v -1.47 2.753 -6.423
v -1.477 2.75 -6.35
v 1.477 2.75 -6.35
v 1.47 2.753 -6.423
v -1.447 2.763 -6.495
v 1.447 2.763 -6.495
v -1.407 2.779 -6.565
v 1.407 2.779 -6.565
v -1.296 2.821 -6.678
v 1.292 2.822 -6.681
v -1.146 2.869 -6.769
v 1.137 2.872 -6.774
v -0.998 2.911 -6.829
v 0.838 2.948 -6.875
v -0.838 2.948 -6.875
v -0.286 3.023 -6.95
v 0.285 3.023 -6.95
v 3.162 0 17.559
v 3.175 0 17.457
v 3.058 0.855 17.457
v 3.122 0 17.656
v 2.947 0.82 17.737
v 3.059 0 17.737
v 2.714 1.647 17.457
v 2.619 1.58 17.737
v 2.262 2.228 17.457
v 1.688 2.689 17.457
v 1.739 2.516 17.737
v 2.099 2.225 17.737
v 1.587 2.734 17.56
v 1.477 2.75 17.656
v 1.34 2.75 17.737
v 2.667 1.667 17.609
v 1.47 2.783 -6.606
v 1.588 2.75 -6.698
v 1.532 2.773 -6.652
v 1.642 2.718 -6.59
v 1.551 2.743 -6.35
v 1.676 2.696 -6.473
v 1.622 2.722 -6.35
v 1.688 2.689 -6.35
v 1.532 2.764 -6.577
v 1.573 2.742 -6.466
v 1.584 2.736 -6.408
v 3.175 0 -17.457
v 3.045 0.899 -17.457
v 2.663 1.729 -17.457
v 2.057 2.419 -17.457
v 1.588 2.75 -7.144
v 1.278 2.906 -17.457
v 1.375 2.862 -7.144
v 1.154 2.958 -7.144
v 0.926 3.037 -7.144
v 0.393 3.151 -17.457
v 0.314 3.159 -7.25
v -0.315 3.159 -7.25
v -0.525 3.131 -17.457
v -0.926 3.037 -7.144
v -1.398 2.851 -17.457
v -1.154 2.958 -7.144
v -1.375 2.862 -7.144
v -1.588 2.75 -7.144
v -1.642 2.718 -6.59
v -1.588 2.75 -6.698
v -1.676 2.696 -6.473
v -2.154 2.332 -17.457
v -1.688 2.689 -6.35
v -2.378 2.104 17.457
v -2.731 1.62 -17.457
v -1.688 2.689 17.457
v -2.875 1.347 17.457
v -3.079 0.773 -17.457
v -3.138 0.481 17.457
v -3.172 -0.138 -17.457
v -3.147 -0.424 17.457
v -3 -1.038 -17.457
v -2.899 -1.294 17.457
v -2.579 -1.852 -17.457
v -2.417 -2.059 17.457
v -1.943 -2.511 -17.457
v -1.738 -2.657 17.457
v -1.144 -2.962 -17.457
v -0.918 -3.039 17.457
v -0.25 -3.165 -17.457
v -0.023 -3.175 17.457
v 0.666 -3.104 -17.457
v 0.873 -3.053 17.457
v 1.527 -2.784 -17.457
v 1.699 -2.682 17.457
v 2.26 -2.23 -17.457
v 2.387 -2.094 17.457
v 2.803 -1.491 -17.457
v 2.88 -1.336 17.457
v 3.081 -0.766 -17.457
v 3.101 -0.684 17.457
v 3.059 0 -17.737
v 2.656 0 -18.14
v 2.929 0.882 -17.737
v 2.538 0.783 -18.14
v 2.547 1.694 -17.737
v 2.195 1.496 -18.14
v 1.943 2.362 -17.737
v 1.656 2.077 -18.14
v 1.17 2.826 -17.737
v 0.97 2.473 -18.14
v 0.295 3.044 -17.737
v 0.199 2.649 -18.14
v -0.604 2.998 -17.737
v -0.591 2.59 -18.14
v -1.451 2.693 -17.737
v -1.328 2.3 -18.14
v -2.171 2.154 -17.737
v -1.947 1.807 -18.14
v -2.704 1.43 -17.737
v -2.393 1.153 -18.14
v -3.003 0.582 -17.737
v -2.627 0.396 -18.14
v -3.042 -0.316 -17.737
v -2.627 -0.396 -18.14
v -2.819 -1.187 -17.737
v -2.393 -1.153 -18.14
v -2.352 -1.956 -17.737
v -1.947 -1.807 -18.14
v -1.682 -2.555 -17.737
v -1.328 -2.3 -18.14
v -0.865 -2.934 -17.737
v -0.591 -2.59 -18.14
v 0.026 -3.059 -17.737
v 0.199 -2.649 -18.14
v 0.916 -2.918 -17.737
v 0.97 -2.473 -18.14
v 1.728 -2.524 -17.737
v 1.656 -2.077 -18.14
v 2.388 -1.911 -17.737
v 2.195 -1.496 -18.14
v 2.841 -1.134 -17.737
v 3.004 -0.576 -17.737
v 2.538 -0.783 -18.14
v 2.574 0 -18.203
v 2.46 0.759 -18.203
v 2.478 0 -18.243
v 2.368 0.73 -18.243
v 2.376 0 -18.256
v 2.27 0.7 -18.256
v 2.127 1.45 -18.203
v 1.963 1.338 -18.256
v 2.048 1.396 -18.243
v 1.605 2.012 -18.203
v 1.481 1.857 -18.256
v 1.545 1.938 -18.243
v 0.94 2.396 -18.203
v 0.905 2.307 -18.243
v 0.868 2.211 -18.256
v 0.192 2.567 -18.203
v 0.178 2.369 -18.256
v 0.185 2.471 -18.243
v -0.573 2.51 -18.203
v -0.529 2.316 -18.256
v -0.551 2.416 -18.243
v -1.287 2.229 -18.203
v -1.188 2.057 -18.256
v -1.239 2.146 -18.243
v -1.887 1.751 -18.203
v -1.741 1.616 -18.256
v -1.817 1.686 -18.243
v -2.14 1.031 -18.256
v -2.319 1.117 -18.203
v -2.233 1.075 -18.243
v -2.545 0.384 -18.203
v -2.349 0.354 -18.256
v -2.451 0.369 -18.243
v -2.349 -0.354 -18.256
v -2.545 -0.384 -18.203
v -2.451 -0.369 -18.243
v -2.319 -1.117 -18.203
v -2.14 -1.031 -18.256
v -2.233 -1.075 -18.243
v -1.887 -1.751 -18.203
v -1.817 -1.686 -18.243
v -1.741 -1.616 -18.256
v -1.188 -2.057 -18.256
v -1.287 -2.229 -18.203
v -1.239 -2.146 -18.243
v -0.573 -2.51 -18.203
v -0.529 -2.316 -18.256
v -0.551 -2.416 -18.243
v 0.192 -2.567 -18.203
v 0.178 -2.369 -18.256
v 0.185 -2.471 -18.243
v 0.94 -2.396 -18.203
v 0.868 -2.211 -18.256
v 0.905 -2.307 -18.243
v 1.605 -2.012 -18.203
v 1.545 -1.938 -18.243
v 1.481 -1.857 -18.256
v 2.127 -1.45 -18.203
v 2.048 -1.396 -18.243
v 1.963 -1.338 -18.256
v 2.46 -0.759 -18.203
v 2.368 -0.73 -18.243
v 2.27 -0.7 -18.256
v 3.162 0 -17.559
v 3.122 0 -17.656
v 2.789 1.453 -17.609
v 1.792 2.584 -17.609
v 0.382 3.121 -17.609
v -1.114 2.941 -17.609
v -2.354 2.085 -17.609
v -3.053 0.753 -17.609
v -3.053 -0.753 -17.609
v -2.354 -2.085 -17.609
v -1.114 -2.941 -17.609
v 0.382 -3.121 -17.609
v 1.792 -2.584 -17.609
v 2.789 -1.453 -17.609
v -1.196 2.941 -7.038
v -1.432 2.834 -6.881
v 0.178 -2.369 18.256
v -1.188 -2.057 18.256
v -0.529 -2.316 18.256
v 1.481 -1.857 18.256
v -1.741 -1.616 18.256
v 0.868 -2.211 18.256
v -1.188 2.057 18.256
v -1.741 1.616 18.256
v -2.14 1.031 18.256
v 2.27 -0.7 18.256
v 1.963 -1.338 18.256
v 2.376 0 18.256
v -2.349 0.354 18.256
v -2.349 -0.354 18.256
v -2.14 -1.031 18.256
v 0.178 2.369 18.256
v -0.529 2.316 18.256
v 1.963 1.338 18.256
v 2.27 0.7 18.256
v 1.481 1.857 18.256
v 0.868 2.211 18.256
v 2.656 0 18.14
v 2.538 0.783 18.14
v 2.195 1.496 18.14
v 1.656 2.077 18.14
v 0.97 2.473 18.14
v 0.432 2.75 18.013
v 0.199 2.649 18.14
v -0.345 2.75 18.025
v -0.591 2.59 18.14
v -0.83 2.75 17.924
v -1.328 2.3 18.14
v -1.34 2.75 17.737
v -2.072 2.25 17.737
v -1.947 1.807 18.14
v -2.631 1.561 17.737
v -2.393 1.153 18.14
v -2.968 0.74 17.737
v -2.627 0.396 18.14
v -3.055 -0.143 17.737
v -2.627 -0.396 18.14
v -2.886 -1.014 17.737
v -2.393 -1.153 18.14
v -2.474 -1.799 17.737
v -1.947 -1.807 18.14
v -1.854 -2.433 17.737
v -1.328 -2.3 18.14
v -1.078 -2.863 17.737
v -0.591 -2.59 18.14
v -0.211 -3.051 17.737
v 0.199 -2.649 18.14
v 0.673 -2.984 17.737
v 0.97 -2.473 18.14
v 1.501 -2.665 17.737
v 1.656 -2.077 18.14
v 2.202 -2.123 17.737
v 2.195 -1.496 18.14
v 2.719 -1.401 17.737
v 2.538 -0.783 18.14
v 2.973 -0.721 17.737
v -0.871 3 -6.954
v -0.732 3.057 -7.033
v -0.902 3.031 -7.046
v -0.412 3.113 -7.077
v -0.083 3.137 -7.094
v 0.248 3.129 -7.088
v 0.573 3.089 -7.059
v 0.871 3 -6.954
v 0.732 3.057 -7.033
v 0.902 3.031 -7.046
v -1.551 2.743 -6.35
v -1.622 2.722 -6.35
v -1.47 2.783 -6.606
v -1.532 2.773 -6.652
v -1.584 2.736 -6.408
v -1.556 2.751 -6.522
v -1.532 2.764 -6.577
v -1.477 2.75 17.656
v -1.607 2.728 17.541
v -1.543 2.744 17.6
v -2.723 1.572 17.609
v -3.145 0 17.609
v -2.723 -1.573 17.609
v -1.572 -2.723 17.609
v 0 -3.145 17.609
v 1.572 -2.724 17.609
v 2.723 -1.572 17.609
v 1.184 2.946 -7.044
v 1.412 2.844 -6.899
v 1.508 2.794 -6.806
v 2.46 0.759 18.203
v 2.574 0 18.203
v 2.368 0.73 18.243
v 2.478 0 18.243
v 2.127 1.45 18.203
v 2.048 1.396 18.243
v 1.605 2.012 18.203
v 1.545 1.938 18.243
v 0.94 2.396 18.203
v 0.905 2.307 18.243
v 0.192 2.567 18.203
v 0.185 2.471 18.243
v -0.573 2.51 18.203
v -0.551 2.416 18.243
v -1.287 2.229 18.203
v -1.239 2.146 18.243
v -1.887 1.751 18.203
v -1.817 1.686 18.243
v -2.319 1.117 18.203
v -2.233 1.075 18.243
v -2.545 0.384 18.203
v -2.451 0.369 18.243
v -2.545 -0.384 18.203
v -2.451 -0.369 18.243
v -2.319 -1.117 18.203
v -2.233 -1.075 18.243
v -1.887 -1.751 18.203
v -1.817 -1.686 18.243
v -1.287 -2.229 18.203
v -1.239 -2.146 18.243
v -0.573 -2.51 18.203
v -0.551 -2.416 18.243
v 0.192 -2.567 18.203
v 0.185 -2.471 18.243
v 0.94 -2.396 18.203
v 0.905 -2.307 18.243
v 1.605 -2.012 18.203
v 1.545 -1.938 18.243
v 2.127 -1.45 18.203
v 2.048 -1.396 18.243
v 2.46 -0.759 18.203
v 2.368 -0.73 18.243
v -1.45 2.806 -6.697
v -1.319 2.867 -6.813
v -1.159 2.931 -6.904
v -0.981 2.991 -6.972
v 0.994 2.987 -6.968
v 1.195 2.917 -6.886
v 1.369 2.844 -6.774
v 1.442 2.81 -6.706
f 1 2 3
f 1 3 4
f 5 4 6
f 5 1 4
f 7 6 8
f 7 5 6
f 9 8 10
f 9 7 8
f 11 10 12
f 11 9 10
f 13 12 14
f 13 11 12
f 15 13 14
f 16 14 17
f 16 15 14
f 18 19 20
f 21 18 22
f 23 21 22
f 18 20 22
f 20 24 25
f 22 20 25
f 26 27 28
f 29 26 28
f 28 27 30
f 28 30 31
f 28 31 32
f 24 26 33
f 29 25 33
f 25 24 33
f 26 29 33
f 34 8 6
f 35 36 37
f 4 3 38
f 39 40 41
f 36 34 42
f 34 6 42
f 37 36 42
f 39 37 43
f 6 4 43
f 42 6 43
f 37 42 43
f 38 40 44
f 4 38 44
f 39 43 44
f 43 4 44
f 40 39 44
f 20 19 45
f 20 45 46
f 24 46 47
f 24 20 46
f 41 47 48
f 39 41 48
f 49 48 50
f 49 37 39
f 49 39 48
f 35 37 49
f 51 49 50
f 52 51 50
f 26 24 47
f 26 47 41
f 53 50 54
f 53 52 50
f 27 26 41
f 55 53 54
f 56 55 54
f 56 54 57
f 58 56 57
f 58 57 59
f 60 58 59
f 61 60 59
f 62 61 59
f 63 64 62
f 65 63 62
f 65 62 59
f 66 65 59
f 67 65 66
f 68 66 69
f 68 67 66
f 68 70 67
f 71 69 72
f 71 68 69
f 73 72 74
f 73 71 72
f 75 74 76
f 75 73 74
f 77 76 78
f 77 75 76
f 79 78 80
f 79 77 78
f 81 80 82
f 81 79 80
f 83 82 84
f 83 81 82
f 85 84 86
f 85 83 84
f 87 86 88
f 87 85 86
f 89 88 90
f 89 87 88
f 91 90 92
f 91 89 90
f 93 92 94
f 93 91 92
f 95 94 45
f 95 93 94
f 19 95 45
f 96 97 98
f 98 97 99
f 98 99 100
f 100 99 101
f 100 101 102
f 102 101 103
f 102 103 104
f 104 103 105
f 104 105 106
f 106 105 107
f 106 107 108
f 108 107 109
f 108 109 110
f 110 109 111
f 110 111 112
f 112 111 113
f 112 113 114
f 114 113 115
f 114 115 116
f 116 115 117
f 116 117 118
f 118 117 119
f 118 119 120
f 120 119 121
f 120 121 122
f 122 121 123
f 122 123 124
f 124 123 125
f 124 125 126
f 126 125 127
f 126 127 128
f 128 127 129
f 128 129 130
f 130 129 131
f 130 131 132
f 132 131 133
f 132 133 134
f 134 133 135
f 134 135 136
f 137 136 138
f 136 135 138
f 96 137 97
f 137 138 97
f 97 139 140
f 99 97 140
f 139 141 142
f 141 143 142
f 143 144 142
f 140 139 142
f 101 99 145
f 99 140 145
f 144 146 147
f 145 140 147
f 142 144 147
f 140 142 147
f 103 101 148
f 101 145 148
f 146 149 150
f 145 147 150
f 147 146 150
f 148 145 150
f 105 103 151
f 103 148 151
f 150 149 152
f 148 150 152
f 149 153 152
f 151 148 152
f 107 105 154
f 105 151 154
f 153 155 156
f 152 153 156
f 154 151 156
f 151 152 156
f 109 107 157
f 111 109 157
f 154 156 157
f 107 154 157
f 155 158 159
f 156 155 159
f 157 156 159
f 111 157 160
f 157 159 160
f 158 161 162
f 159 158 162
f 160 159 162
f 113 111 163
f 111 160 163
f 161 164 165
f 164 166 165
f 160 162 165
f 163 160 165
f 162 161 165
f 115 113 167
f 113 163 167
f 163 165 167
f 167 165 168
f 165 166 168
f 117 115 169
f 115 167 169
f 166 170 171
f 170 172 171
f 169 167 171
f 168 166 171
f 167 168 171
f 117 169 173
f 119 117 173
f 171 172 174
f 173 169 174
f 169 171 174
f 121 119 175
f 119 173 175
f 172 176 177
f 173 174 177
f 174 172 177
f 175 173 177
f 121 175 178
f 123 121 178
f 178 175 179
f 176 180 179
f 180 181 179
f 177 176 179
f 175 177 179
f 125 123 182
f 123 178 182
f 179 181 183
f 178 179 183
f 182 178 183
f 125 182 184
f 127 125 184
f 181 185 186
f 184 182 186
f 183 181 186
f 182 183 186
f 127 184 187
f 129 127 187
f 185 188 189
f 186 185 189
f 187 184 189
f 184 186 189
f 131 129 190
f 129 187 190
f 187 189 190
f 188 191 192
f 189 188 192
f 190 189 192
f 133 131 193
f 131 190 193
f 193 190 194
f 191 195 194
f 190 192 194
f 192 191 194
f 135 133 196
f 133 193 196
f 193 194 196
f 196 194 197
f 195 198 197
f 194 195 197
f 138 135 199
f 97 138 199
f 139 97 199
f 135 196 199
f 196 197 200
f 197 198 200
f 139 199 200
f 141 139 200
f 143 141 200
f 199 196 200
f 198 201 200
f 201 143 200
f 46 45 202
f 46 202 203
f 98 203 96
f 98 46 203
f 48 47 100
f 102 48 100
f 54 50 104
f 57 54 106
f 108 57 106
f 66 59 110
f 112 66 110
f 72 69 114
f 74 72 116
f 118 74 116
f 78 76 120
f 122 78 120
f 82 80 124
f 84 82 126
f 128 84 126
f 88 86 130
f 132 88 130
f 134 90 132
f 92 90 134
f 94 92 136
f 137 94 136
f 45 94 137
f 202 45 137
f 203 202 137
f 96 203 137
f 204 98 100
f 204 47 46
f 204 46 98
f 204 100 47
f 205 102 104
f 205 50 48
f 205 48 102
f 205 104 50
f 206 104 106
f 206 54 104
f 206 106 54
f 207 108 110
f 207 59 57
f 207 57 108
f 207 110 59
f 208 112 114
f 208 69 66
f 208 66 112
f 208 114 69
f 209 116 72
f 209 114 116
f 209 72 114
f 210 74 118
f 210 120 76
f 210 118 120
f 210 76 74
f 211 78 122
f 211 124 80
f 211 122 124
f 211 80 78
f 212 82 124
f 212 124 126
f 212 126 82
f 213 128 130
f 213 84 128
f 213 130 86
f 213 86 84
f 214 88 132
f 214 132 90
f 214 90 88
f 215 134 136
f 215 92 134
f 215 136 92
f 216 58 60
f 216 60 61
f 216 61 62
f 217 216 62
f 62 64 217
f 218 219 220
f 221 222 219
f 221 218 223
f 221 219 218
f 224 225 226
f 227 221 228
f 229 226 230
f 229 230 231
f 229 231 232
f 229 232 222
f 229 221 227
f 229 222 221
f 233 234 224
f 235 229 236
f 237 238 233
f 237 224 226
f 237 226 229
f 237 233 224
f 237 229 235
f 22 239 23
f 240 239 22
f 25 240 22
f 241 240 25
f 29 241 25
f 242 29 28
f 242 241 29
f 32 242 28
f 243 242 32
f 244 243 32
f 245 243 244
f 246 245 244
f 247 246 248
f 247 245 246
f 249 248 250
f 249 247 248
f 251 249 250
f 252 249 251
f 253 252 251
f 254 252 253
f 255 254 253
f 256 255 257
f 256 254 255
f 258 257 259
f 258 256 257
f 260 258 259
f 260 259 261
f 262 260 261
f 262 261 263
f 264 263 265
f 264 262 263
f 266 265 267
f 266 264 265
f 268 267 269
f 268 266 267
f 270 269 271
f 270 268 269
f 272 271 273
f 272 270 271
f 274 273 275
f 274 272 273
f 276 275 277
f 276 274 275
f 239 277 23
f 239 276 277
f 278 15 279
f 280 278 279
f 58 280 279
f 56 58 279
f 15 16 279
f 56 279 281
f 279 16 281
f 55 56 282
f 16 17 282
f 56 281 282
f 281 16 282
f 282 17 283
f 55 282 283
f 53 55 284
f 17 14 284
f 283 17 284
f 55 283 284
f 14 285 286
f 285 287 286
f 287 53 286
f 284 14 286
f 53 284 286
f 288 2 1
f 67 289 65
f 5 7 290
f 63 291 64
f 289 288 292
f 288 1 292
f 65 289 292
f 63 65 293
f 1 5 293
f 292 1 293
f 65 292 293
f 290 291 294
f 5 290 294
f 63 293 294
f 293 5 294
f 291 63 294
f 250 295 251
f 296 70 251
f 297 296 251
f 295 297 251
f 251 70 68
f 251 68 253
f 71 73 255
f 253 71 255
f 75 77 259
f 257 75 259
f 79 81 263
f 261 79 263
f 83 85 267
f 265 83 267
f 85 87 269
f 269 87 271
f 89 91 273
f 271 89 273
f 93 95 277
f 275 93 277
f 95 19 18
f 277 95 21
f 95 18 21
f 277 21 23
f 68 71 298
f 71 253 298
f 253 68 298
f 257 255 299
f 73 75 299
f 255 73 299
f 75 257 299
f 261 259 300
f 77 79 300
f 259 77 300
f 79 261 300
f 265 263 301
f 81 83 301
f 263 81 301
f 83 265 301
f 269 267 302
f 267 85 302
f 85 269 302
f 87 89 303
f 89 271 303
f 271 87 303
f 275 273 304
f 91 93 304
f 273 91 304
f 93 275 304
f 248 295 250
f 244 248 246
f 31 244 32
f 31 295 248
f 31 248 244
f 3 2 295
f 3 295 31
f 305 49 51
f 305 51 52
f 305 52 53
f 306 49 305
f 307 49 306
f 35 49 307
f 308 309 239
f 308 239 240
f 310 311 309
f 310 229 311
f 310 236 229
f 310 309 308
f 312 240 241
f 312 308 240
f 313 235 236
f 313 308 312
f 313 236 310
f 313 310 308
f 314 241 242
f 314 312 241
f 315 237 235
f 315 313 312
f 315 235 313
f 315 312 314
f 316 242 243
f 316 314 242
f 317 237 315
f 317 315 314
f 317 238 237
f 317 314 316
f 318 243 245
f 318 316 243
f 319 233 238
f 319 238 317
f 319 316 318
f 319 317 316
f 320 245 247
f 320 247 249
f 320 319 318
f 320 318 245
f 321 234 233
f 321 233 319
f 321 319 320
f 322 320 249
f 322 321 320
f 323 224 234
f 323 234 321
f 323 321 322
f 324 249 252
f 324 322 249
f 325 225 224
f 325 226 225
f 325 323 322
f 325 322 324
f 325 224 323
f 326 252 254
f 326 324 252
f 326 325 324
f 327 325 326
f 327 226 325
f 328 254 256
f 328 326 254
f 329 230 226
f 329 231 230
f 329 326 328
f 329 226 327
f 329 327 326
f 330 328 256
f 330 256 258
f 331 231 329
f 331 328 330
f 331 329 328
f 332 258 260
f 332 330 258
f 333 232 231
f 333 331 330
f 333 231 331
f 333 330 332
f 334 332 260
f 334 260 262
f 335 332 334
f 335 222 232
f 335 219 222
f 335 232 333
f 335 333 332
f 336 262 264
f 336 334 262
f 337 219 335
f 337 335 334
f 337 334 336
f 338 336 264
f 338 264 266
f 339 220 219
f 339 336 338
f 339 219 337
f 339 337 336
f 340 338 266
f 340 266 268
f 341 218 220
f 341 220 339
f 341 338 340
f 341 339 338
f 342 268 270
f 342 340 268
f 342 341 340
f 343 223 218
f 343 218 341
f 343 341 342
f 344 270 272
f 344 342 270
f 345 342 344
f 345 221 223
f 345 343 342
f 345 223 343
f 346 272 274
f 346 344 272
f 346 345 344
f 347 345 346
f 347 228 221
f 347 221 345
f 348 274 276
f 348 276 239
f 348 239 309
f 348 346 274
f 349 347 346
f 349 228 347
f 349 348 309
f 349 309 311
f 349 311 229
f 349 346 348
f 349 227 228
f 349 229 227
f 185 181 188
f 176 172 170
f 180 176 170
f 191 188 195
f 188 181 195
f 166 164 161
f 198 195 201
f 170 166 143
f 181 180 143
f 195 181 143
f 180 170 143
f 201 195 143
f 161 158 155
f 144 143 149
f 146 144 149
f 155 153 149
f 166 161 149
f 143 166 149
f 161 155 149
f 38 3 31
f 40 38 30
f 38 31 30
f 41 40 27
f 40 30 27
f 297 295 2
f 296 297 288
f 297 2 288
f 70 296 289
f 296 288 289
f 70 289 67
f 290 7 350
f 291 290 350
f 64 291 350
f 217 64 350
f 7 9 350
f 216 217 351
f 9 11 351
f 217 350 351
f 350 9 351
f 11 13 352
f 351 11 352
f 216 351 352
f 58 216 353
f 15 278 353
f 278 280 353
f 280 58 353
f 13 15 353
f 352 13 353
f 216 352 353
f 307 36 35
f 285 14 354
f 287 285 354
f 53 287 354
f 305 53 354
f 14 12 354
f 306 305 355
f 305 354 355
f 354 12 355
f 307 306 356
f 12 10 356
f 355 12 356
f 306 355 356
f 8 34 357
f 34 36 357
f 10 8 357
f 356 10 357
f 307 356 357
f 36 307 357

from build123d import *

# Parameters (mm, degrees)
SKETCH1_R      = 3.175
EXTRUDE1_DEPTH = 18.25625
CHAMFER1_SIZE  = 0.635
EXTRUDE7_DEPTH = 26.793821935
FILLET1_R      = 0.79375
FILLET3_R      = 0.396875


with BuildPart() as part:
    # Sketch1 → Extrude1 (new, symmetric)
    with BuildSketch(Plane.XY):
        Circle(SKETCH1_R)
    extrude(amount=EXTRUDE1_DEPTH, both=True)

    # Chamfer1
    chamfer1_edges = [part.edges().sort_by_distance(p)[0] for p in [
        (-3.175, 0, -18.25625),
        (-3.175, 0, 18.25625),
    ]]
    chamfer(chamfer1_edges, length=CHAMFER1_SIZE)

    # Sketch13 → Extrude7 (cut, through all)
    with BuildSketch(Plane.XY.offset(-7.14375)):
        with BuildLine():
            Line((-1.5875, 2.749630657), (1.5875, 2.749630657))
            ThreePointArc((1.5875, 2.749630657), (0, 3.175), (-1.5875, 2.749630657))
        make_face()
    extrude(amount=EXTRUDE7_DEPTH, mode=Mode.SUBTRACT)

    # Fillet1
    # the kernel refuses this fillet: 0.79375 mm, written as the material it adds along each edge
    with BuildSketch(Plane(origin=(-3.571875, 2.749630657, -7.14375), x_dir=(0, 0, 1), z_dir=(1, 0, 0))) as fillet1_piece_1_section:
        with BuildLine():
            CenterArc((FILLET1_R, -FILLET1_R), FILLET1_R, 90, 90)
            Line((0, -FILLET1_R), (0, 0))
            Line((0, 0), (FILLET1_R, 0))
        make_face()
    fillet1_piece_1 = extrude(amount=7.14375, mode=Mode.PRIVATE)
    fillet1_piece_1 = fillet1_piece_1 & Plane(origin=(0, 0, -6.922980594), x_dir=(1, 0, 0), z_dir=(0, 0, 1)) * Cylinder(3.175, 18, mode=Mode.PRIVATE)
    add(fillet1_piece_1)

    # Fillet3
    fillet3_edges = [part.edges().sort_by_distance(p)[0] for p in [
        (1.5875, 2.749630657, 5.635625),
        (-1.5875, 2.749630657, 5.635625),
        (0, 3.175, -7.053089435),
        (-2.54, 0, -18.25625),
        (-3.175, 0, -17.62125),
        (-2.54, 0, 18.25625),
        (-1.5875, -2.749630657, 17.62125),
    ]]
    fillet(fillet3_edges, radius=FILLET3_R)


solid = part.part
